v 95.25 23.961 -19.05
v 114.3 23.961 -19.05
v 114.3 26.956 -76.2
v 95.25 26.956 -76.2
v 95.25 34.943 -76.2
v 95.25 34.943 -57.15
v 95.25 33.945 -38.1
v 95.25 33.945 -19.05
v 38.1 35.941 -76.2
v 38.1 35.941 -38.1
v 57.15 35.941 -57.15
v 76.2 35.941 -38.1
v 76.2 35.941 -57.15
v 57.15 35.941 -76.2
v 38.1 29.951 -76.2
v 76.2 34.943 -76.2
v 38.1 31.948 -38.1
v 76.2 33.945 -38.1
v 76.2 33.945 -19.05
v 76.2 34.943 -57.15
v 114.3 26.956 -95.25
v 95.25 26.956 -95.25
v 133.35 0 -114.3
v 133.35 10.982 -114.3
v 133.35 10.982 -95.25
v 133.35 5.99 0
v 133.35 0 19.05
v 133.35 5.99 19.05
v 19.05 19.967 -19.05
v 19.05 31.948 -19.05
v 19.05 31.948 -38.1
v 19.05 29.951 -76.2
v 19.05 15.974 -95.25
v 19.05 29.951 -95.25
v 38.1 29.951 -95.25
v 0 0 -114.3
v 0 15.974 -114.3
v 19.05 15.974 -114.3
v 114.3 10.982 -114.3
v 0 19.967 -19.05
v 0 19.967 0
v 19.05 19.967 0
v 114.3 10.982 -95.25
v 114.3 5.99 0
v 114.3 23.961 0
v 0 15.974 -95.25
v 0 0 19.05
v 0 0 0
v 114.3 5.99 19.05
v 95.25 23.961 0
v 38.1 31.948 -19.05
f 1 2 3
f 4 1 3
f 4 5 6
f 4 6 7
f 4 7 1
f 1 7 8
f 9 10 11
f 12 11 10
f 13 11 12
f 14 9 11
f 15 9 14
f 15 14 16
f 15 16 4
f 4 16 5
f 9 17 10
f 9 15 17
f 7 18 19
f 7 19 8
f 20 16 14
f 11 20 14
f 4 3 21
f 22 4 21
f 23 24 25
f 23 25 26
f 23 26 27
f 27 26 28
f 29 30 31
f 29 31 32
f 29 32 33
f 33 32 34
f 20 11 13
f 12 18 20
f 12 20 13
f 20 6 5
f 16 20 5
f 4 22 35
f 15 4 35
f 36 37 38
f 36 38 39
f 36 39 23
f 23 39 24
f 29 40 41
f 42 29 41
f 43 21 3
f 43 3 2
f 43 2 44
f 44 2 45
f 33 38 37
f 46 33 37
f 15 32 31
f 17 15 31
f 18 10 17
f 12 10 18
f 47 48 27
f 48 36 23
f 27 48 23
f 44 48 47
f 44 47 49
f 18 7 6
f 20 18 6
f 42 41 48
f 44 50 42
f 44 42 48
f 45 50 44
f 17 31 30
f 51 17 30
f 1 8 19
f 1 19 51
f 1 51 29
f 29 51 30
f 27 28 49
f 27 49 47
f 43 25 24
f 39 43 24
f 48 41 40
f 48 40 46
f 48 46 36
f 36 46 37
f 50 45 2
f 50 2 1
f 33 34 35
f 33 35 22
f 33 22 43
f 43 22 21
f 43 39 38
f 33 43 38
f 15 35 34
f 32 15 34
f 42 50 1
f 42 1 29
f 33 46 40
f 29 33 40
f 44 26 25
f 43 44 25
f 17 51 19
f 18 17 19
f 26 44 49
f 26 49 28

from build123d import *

# Parameters (mm, degrees)
BOSS_EXTRUDE1_DEPTH  = 19.05
BOSS_EXTRUDE2_DEPTH  = 19.05
BOSS_EXTRUDE3_DEPTH  = 19.05
BOSS_EXTRUDE4_DEPTH  = 19.05
BOSS_EXTRUDE5_DEPTH  = 19.05
BOSS_EXTRUDE6_DEPTH  = 19.05
BOSS_EXTRUDE7_DEPTH  = 19.05
BOSS_EXTRUDE8_DEPTH  = 19.05
BOSS_EXTRUDE9_DEPTH  = 19.05
BOSS_EXTRUDE10_DEPTH = 19.05
BOSS_EXTRUDE11_DEPTH = 19.05
SKETCH12_W           = 38.1
SKETCH12_H           = 35.941255032
BOSS_EXTRUDE12_DEPTH = 19.05


with BuildPart() as part:
    # Sketch1 → Boss-Extrude1 (new body)
    with BuildSketch(Plane.XY):
        Polygon((0, 0), (114.3, 5.990209172), (133.35, 5.990209172), (133.35, 0), align=None)
    extrude(amount=BOSS_EXTRUDE1_DEPTH)

    # Sketch2 → Boss-Extrude2 (add)
    with BuildSketch(Plane(origin=(133.35, 0, 0), x_dir=(0, 0, -1), z_dir=(1, 0, 0))):
        Polygon((0, 0), (0, 5.990209172), (95.25, 10.982050149), (114.3, 10.982050149), (114.3, 0), align=None)
    extrude(amount=-BOSS_EXTRUDE2_DEPTH)

    # Sketch3 → Boss-Extrude3 (add)
    with BuildSketch(Plane(origin=(0, 0, -114.3), x_dir=(-1, 0, 0), z_dir=(0, 0, -1))):
        Polygon((-114.3, 0), (-114.3, 10.982050149), (-19.05, 15.973891125), (0, 15.973891125), (0, 0), align=None)
    extrude(amount=-BOSS_EXTRUDE3_DEPTH)

    # Sketch4 → Boss-Extrude4 (add)
    with BuildSketch(Plane.ZY):
        Polygon((-95.25, 15.973891125), (-19.05, 19.967363907), (0, 19.967363907), (0, 0), (-95.25, 0), align=None)
    extrude(amount=-BOSS_EXTRUDE4_DEPTH)

    # Sketch5 → Boss-Extrude5 (add)
    with BuildSketch(Plane.XY):
        Polygon((95.25, 23.960836688), (19.05, 19.967363907), (19.05, 0), (114.3, 0), (114.3, 23.960836688), align=None)
    extrude(amount=-BOSS_EXTRUDE5_DEPTH)

    # Sketch6 → Boss-Extrude6 (add)
    with BuildSketch(Plane(origin=(114.3, 0, 0), x_dir=(0, 0, -1), z_dir=(1, 0, 0))):
        Polygon((19.05, 23.960836688), (76.2, 26.955941274), (95.25, 26.955941274), (95.25, 0), (19.05, 0), align=None)
    extrude(amount=-BOSS_EXTRUDE6_DEPTH)

    # Sketch7 → Boss-Extrude7 (add)
    with BuildSketch(Plane(origin=(0, 0, -95.25), x_dir=(-1, 0, 0), z_dir=(0, 0, -1))):
        Polygon((-95.25, 26.955941274), (-38.1, 29.95104586), (-19.05, 29.95104586), (-19.05, 0), (-95.25, 0), align=None)
    extrude(amount=-BOSS_EXTRUDE7_DEPTH)

    # Sketch8 → Boss-Extrude8 (add)
    with BuildSketch(Plane.ZY.offset(-19.05)):
        Polygon((-76.2, 29.95104586), (-38.1, 31.947782251), (-19.05, 31.947782251), (-19.05, 0), (-76.2, 0), align=None)
    extrude(amount=-BOSS_EXTRUDE8_DEPTH)

    # Sketch9 → Boss-Extrude9 (add)
    with BuildSketch(Plane.XY.offset(-19.05)):
        Polygon((38.1, 31.947782251), (76.2, 33.944518642), (95.25, 33.944518642), (95.25, 0), (38.1, 0), align=None)
    extrude(amount=-BOSS_EXTRUDE9_DEPTH)

    # Sketch10 → Boss-Extrude10 (add)
    with BuildSketch(Plane(origin=(95.25, 0, 0), x_dir=(0, 0, -1), z_dir=(1, 0, 0))):
        Polygon((38.1, 0), (38.1, 33.944518642), (57.15, 34.942886837), (76.2, 34.942886837), (76.2, 0), align=None)
    extrude(amount=-BOSS_EXTRUDE10_DEPTH)

    # Sketch11 → Boss-Extrude11 (add)
    with BuildSketch(Plane(origin=(0, 0, -76.2), x_dir=(-1, 0, 0), z_dir=(0, 0, -1))):
        Polygon((-76.2, 34.942886837), (-57.15, 35.941255032), (-38.1, 35.941255032), (-38.1, 0), (-76.2, 0), align=None)
    extrude(amount=-BOSS_EXTRUDE11_DEPTH)

    # Sketch12 → Boss-Extrude12 (add)
    with BuildSketch(Plane.XY.offset(-57.15)):
        with Locations((57.15, 17.970627516)):
            Rectangle(SKETCH12_W, SKETCH12_H)
    extrude(amount=BOSS_EXTRUDE12_DEPTH)


solid = part.part
